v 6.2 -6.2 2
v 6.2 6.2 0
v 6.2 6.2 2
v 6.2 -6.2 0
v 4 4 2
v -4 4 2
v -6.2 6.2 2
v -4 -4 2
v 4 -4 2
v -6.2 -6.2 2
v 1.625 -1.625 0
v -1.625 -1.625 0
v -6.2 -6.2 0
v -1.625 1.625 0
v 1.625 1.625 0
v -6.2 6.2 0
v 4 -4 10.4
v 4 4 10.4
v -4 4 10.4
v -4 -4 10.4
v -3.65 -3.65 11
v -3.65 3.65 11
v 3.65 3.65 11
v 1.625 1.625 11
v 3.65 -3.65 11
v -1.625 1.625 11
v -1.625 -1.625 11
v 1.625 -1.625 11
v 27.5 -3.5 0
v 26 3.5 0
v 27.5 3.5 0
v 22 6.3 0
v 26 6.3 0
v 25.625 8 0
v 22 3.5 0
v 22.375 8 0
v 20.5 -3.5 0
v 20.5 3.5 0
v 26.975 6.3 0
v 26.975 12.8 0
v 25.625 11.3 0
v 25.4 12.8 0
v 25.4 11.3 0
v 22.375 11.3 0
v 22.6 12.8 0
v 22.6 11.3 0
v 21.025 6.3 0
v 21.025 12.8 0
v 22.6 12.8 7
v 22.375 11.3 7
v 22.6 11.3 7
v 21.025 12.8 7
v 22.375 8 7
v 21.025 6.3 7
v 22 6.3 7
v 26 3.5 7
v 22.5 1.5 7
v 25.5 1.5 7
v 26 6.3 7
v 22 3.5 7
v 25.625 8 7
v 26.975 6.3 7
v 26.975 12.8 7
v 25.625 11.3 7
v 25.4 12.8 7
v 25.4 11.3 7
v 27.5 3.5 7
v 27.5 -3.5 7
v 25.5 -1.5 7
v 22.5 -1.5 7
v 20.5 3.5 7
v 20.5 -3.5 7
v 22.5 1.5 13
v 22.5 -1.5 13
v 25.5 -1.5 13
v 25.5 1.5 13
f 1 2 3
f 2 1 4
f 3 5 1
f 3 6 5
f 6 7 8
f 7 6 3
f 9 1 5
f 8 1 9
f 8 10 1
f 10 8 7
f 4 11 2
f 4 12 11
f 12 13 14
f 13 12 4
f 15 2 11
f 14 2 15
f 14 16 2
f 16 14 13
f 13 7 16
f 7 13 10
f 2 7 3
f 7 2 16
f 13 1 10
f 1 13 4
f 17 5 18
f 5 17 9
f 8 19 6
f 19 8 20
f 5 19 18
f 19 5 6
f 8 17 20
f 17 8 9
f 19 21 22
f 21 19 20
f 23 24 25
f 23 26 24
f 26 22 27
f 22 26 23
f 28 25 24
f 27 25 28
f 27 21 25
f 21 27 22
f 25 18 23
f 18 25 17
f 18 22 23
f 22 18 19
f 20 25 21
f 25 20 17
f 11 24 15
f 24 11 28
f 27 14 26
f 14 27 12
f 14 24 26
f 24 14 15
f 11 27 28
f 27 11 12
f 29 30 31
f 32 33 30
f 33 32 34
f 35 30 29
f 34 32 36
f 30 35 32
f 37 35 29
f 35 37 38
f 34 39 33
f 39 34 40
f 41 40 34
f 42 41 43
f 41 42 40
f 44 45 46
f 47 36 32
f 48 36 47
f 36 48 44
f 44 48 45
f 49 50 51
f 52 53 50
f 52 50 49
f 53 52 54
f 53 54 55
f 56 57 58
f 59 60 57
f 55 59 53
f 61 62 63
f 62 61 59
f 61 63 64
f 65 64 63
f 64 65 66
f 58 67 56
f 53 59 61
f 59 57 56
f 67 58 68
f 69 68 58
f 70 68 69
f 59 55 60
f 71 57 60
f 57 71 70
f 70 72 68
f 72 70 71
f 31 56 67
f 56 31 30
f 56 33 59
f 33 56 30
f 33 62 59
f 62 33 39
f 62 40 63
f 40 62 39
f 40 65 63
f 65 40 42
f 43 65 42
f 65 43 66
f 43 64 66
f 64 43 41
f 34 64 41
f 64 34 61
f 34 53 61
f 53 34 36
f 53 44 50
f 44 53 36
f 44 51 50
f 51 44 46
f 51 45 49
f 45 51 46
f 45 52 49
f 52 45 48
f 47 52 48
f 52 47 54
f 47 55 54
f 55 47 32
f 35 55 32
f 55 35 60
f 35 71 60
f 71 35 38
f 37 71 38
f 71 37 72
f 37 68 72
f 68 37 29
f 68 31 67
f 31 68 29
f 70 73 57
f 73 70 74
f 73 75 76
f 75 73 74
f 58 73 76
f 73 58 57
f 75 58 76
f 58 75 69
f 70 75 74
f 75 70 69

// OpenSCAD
// PVC square tube LED flat aluminium strip terminal - V2
// Lina Lopes / prototype, 2026-10-29
// Units: mm. Export modes: "layout", "cap", "clip", "assembled".
// NO SUPPORTS: export cap and clip separately, in their modeled orientations.
$fn=40;
mode="layout";

// PVC profile: OD 12 x 12, ID nominal 8 x 8.
cap_size=12.4;      // 0.2 mm lip per side
cap_thick=2.0;
insert_width=8.0;   // nominal press fit; tested V1 at 7.8 was too loose
insert_length=9;
insert_lead=0.6;
// Mechanical link: square peg and through-opening
socket_width=3.25;
peg_width=3.0;
peg_length=6.0;
// Flexible C jaw for flat aluminum strip 3 wide x 1 thick
clip_z=7.0;         // longer C jaw for much better stability
mouth_width=2.8;    // narrow snap entrance across 3 mm strip width
cavity_width=3.25;
cavity_depth=3.35;  // aluminium (1 mm) + COB (2 mm) + clearance
back_thickness=1.65;
arm_thickness=1.35;

module cap(){
  // Exposed cap face at z=0. Print with this face on build plate.
  difference(){
    union(){
      translate([-cap_size/2,-cap_size/2,0]) cube([cap_size,cap_size,cap_thick]);
      // pin standing on the cap, no overhangs
      translate([-insert_width/2,-insert_width/2,cap_thick])
        cube([insert_width,insert_width,insert_length-insert_lead]);
      // chamfered lead-in on pin
      translate([0,0,cap_thick+insert_length-insert_lead])
        linear_extrude(height=insert_lead,scale=(insert_width-0.7)/insert_width)
           square([insert_width,insert_width],center=true);
    }
    // unobstructed through-hole for clip peg; vertical means no supports
    translate([-socket_width/2,-socket_width/2,-0.1])
       cube([socket_width,socket_width,cap_thick+insert_length+0.2]);
  }
}

// Clip is printed with its open C face on the bed, square pin growing upward.
// The larger C grips the WHOLE stack (aluminum + COB) with no pinching on the adhesive interface.
// Coordinates: mouth facing +Y, capturing strip oriented along X, its
// 3 mm width between +/- cavity_width/2, and 3 mm combined thickness in Y.
module clip_profile(){
  union(){
    // peg footprint reinforced by a central mounting base
    square([7,7],center=true);
    // neck carries the C away from the cap centre
    translate([-2,2.2]) square([4,5.8]);
    // C pocket: longer, deep enough for aluminum + COB.
    // curved corners are not required for a first functional print
    difference(){
      translate([-cavity_width/2-arm_thickness,6.3])
         square([cavity_width+2*arm_thickness,6.5]);
      // Pocket 3.25 mm wide by 3.35 mm deep; snap opening 2.8 mm wide.
      translate([-cavity_width/2,7.95]) square([cavity_width,cavity_depth]);
      translate([-mouth_width/2,7.95+cavity_depth]) square([mouth_width,2]);
    }
  }
}

module clip(){
  union(){
    linear_extrude(height=clip_z) clip_profile();
    translate([0,0,clip_z])
       linear_extrude(height=peg_length)
          square([peg_width,peg_width],center=true);
  }
}

if (mode=="cap") cap();
else if(mode=="clip") clip();
else if(mode=="assembled"){
  color("ivory") cap();
  // face of cap at z=0; clip peg enters upwards from below
  color("lightsteelblue") translate([0,0,-clip_z]) clip();
}
else {
  cap();
  translate([24,0,0]) clip();
}
